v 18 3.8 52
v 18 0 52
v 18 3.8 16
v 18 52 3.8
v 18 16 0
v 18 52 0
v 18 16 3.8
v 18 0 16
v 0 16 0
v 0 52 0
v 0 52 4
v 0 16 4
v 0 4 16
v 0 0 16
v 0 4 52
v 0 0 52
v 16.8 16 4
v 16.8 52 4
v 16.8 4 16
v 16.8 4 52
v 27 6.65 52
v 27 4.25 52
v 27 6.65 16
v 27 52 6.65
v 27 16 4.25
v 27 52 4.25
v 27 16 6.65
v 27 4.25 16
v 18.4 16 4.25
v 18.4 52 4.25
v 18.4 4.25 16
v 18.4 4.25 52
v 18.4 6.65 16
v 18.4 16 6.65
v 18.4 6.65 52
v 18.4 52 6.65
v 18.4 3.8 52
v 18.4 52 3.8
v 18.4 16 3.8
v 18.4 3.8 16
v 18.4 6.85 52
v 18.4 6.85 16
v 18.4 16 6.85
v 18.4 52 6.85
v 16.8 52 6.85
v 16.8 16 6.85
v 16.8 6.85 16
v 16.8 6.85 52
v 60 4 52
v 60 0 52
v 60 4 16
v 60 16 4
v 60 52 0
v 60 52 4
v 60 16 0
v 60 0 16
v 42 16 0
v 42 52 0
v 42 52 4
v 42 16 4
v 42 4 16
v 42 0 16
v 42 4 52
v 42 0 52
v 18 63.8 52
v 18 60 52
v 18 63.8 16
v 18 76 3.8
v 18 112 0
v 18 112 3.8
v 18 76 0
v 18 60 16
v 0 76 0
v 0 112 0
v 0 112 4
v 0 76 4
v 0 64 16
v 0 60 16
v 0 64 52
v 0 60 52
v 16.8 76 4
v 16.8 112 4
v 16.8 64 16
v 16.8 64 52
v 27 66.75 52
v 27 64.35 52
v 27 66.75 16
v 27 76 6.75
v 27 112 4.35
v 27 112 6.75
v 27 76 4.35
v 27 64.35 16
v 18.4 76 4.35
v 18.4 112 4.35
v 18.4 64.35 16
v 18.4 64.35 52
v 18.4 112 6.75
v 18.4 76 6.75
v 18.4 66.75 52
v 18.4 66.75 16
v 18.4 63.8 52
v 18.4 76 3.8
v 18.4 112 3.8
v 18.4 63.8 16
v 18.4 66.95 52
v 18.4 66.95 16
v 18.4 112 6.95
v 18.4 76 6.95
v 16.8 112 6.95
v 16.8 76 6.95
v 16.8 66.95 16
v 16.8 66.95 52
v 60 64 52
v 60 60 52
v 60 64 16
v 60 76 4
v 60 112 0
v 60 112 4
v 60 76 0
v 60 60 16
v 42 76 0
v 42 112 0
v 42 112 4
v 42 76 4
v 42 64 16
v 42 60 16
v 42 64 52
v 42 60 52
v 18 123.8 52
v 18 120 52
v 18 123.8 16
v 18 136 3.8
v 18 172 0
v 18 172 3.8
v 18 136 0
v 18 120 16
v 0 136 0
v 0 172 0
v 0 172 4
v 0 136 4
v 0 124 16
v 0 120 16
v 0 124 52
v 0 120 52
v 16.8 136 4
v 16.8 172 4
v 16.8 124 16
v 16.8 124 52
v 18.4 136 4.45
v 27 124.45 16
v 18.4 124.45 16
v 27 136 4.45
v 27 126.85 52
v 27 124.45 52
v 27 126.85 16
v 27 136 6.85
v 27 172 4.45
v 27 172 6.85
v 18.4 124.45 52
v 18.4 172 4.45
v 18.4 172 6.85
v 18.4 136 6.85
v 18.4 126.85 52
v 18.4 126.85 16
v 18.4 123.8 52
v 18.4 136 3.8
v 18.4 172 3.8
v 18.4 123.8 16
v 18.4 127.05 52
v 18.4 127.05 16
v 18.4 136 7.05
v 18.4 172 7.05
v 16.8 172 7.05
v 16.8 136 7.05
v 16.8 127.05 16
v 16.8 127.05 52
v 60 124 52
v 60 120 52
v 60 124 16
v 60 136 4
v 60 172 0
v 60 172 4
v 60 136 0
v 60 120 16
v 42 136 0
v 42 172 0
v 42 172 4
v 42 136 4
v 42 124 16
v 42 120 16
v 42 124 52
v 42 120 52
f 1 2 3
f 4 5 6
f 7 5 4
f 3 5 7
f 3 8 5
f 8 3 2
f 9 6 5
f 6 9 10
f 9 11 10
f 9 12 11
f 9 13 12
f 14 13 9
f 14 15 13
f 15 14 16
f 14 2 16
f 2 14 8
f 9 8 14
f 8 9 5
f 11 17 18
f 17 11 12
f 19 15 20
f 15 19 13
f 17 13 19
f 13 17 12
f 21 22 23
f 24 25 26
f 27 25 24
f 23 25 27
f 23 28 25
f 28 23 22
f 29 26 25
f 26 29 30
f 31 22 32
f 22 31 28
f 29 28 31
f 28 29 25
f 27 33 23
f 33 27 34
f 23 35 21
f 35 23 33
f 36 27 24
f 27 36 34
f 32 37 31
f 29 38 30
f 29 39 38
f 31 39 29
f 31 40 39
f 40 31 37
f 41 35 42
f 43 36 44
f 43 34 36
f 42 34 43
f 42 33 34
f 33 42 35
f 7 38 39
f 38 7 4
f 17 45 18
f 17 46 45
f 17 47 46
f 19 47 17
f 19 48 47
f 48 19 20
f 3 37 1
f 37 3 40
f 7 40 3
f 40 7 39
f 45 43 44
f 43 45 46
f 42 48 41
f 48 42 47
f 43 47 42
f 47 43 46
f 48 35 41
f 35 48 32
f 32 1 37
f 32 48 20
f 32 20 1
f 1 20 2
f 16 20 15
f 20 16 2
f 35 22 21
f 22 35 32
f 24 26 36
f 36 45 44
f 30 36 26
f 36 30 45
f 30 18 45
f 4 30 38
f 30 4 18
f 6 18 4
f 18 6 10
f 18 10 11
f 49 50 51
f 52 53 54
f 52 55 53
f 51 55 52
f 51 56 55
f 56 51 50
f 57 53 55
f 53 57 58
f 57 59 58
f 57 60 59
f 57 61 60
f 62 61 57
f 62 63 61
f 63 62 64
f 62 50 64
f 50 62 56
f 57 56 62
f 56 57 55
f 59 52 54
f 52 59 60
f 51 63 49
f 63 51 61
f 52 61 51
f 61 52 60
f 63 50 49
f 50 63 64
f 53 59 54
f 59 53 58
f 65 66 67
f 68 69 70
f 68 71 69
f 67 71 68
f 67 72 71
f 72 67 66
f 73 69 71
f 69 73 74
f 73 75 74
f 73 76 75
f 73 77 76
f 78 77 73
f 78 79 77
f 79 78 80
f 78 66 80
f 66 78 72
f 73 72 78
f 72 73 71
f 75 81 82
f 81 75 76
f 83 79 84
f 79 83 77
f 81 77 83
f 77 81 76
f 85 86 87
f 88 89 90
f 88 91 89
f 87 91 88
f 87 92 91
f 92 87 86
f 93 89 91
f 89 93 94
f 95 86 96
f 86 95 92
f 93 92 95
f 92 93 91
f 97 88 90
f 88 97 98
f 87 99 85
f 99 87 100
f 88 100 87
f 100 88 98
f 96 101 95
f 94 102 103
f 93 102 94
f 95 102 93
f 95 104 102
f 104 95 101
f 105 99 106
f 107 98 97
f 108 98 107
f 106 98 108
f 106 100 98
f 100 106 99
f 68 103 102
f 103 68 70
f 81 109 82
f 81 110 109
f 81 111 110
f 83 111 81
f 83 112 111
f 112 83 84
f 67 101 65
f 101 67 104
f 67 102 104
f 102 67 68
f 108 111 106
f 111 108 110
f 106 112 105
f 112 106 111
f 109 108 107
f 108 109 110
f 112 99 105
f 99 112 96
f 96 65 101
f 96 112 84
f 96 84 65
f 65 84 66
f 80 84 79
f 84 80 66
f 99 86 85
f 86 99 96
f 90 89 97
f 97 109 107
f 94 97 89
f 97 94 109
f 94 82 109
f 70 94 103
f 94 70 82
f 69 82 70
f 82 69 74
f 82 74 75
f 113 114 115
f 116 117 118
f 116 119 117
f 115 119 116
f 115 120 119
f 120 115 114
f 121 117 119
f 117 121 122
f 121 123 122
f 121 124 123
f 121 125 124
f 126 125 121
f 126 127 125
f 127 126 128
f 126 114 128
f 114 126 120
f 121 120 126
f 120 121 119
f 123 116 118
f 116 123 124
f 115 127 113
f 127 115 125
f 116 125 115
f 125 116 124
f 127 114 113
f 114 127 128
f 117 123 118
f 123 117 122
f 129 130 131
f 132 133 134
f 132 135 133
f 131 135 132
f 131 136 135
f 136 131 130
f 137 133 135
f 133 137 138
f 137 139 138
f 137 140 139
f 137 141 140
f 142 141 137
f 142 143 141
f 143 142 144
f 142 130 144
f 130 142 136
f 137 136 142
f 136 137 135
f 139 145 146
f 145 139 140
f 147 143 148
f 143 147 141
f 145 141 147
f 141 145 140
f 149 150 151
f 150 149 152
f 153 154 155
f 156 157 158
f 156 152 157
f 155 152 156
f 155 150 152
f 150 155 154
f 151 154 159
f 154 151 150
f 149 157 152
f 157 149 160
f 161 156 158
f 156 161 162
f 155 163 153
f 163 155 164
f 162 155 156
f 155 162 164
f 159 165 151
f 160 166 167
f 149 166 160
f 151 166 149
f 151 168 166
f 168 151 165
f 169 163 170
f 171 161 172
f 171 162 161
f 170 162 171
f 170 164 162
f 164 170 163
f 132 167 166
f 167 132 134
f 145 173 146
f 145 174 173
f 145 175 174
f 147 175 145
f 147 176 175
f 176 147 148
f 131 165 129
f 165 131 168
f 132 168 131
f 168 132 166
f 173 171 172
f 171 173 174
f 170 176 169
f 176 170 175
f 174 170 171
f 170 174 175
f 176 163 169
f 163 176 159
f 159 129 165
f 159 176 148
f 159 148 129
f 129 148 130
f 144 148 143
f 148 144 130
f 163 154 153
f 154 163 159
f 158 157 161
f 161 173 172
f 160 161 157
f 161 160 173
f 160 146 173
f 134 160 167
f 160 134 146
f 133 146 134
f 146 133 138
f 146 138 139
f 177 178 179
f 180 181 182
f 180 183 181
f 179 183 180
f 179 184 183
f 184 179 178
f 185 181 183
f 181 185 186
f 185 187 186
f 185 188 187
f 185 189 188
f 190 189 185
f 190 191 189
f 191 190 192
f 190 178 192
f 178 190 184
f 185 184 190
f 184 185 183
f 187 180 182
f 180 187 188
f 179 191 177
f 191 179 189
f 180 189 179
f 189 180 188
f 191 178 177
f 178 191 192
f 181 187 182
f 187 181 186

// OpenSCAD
// Reduced-cost coupon for the real octagonal chassis split interface.
// Each row contains a male corner and a matching female shell corner.

$fn = 32;

body_y = 155;
body_z = 195;
chamfer = 16;
wall = 4;
shell_length = 18;
collar_length = 9;
collar_embed = 1.2;
collar_wall = 2.4;
corner_window = 52;
clearances = [0.25, 0.35, 0.45];

module oct_prism_x(length, width, height, cut) {
    translate([0, 0, height])
        rotate([0, 90, 0])
            linear_extrude(height = length)
                polygon([
                    [cut, 0], [height - cut, 0], [height, cut],
                    [height, width - cut], [height - cut, width],
                    [cut, width], [0, width - cut], [0, cut]
                ]);
}

module shell_ring(length) {
    difference() {
        oct_prism_x(length, body_y, body_z, chamfer);
        translate([-0.5, wall, wall])
            oct_prism_x(length + 1, body_y - 2 * wall, body_z - 2 * wall, chamfer - wall);
    }
}

module collar(clearance) {
    inset = wall + clearance;
    union() {
        translate([collar_embed - 0.2, inset, inset])
        difference() {
            oct_prism_x(collar_length + 0.2, body_y - 2 * inset, body_z - 2 * inset, chamfer - inset);
            translate([-0.5, collar_wall, collar_wall])
                oct_prism_x(collar_length + 1.2, body_y - 2 * inset - 2 * collar_wall, body_z - 2 * inset - 2 * collar_wall, chamfer - inset - collar_wall);
        }

        anchor_inset = wall - 0.2;
        anchor_thickness = collar_wall + clearance + 0.4;
        translate([0, anchor_inset, anchor_inset])
        difference() {
            oct_prism_x(collar_embed + 0.4, body_y - 2 * anchor_inset, body_z - 2 * anchor_inset, chamfer - anchor_inset);
            translate([-0.5, anchor_thickness, anchor_thickness])
                oct_prism_x(collar_embed + 1.4, body_y - 2 * anchor_inset - 2 * anchor_thickness, body_z - 2 * anchor_inset - 2 * anchor_thickness, chamfer - anchor_inset - anchor_thickness);
        }
    }
}

module corner_crop() {
    // Bottom-left chamfer plus portions of its two adjacent straight walls.
    intersection() {
        children();
        translate([-1, -1, -1]) cube([shell_length + collar_length + 2, corner_window + 1, corner_window + 1]);
    }
}

module male_corner(clearance) {
    corner_crop()
        union() {
            shell_ring(shell_length);
            translate([shell_length - collar_embed, 0, 0]) collar(clearance);
        }
}

module female_corner() {
    corner_crop() shell_ring(shell_length);
}

for (i = [0 : len(clearances) - 1]) {
    y = i * 60;
    translate([0, y, 0]) male_corner(clearances[i]);
    translate([42, y, 0]) female_corner();
}

echo("collar clearance per side candidates mm", clearances);
echo("coupon part count", len(clearances) * 2);
echo("retention", "not represented; full interface will use bottom-access M3 fasteners");
